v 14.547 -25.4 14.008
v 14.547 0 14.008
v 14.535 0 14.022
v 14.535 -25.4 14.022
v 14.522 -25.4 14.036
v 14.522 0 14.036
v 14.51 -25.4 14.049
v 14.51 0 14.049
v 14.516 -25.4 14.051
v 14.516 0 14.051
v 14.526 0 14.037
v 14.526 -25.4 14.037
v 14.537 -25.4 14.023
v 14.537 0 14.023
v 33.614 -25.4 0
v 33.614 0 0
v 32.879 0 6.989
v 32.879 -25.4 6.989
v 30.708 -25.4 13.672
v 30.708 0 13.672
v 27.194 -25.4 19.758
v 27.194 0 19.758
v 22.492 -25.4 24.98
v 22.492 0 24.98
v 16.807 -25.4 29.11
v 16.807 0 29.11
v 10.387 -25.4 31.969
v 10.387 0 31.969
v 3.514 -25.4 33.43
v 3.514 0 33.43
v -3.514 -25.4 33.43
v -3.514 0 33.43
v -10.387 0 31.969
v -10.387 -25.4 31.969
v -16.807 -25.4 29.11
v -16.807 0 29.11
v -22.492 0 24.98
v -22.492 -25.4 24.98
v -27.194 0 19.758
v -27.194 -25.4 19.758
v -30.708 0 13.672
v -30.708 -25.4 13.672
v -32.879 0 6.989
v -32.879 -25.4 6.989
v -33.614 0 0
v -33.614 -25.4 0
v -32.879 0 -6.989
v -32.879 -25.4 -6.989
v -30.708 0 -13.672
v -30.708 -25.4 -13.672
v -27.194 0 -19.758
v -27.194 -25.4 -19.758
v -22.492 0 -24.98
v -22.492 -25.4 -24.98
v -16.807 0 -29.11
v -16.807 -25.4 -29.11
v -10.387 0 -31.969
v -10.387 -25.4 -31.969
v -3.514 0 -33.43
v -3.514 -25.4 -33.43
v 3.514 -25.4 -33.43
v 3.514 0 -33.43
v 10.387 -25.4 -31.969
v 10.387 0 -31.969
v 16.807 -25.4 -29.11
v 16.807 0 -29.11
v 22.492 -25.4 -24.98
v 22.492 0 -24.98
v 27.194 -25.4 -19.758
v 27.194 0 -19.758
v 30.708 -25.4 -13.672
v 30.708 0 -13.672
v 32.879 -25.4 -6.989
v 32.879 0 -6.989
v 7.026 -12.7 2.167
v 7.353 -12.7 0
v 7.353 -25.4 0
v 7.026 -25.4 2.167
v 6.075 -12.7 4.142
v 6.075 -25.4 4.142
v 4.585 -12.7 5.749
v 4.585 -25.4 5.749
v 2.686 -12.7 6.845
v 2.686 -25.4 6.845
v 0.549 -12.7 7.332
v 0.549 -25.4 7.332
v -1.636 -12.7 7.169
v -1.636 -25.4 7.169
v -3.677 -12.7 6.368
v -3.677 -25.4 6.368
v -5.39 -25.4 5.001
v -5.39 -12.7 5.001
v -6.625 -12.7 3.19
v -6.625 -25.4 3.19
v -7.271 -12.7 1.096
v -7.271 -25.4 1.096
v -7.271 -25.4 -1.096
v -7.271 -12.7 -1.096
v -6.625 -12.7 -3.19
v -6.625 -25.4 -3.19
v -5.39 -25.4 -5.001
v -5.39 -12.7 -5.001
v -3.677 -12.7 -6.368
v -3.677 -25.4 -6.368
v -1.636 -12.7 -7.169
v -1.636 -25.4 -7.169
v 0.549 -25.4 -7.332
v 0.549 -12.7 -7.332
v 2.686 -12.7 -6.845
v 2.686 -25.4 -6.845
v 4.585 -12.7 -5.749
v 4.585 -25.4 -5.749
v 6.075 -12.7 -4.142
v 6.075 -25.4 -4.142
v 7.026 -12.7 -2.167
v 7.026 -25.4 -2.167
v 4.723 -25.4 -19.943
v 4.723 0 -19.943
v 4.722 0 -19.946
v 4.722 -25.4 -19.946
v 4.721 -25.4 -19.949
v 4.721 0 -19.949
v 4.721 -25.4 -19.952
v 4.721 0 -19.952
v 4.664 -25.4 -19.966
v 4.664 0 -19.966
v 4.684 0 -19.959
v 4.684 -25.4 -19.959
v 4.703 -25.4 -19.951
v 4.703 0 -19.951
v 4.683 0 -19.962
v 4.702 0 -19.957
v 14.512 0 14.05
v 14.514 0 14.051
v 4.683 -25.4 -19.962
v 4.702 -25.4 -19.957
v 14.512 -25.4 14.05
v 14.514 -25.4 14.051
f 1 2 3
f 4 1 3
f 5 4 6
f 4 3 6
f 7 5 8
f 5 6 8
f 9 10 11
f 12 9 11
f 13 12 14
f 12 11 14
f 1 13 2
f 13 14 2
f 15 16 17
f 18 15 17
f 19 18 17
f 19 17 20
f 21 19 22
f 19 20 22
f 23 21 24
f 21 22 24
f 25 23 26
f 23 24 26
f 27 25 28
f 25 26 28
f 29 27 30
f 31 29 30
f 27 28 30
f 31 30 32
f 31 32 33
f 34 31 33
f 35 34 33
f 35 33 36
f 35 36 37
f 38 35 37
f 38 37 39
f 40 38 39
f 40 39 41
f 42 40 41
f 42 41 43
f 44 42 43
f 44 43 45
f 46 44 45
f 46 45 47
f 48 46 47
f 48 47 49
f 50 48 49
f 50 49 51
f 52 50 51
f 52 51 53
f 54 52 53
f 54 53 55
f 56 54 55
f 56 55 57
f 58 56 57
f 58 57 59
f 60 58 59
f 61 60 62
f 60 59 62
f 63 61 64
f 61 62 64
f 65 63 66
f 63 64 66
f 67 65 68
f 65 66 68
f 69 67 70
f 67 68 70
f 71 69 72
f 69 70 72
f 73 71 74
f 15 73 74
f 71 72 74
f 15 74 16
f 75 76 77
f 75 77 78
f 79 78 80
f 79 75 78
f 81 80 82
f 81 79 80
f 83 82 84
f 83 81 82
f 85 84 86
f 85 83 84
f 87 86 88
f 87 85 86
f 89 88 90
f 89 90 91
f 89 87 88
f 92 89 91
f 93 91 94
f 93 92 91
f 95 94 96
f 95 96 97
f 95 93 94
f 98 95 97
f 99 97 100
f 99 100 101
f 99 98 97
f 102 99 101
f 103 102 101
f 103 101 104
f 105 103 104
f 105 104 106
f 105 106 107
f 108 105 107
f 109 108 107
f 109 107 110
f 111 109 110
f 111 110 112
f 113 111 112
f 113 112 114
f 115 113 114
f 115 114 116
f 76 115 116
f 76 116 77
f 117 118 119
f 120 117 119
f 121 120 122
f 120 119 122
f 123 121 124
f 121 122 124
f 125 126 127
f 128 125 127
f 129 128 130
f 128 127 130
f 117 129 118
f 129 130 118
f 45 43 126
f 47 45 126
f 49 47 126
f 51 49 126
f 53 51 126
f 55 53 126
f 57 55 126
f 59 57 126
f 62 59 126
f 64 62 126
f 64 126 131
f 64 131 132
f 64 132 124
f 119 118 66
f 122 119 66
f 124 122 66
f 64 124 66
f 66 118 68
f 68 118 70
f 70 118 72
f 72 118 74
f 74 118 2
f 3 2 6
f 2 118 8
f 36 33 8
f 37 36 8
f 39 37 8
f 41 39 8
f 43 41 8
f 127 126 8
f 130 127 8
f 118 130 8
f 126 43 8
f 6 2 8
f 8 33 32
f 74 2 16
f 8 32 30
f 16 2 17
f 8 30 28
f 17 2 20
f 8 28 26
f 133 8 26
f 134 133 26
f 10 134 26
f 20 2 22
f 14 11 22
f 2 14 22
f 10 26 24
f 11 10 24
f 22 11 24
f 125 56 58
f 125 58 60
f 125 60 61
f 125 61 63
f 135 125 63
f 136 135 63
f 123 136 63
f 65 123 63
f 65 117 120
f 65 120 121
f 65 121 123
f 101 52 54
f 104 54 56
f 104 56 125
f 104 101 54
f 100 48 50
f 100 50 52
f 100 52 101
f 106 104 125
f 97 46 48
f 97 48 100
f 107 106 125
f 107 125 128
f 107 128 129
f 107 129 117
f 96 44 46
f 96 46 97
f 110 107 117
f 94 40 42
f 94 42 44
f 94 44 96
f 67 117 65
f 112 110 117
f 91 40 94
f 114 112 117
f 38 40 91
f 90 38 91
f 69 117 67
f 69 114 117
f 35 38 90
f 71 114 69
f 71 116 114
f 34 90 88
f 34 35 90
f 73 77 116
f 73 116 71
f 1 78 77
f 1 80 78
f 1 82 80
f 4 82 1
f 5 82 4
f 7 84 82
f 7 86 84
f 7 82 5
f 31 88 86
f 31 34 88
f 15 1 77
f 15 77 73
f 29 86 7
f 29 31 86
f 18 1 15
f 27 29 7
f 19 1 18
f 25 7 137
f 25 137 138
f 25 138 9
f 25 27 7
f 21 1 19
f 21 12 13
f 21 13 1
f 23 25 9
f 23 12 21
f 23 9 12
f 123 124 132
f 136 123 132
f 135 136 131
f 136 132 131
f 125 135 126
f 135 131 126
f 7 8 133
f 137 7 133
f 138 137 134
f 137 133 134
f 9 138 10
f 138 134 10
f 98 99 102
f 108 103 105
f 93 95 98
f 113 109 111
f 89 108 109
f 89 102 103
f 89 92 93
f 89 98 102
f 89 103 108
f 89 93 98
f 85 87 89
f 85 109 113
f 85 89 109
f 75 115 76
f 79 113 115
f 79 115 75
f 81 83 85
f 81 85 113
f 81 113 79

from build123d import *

# Parameters (mm, degrees)
F0_R     = 33.613844165
F0_R_2   = 7.3530240303
F1_DEPTH = 12.7
F2_DEPTH = 25.4


with BuildPart() as f1:
    # F0 (on Front) → F1 (new body)
    with BuildSketch(Plane.XZ):
        Circle(F0_R)
        with BuildLine():
            ThreePointArc((4.7208512746, -19.951569966), (4.6925332266, -19.9590350044), (4.6642082743, -19.9664738029))
            ThreePointArc((4.6642082743, -19.9664738029), (4.6934800842, -19.9547063806), (4.7227373879, -19.9429029377))
            ThreePointArc((4.7227373879, -19.9429029377), (4.7217944882, -19.947236486), (4.7208512746, -19.951569966))
        make_face(mode=Mode.SUBTRACT)
        Circle(F0_R_2, mode=Mode.SUBTRACT)
        with BuildLine():
            ThreePointArc((14.5159144375, 14.0511614861), (14.5316083012, 14.029833317), (14.547274448, 14.0084847808))
            ThreePointArc((14.547274448, 14.0084847808), (14.5285756501, 14.0288524457), (14.5098472673, 14.0491929102))
            ThreePointArc((14.5098472673, 14.0491929102), (14.5128808291, 14.0501772698), (14.5159144375, 14.0511614861))
        make_face(mode=Mode.SUBTRACT)
        Circle(F0_R_2)
    extrude(amount=F1_DEPTH)

    # F0 (on Front) → F2 (join)
    with BuildSketch(Plane.XZ):
        Circle(F0_R)
        with BuildLine():
            ThreePointArc((4.7208512746, -19.951569966), (4.6925332266, -19.9590350044), (4.6642082743, -19.9664738029))
            ThreePointArc((4.6642082743, -19.9664738029), (4.6934800842, -19.9547063806), (4.7227373879, -19.9429029377))
            ThreePointArc((4.7227373879, -19.9429029377), (4.7217944882, -19.947236486), (4.7208512746, -19.951569966))
        make_face(mode=Mode.SUBTRACT)
        Circle(F0_R_2, mode=Mode.SUBTRACT)
        with BuildLine():
            ThreePointArc((14.5159144375, 14.0511614861), (14.5316083012, 14.029833317), (14.547274448, 14.0084847808))
            ThreePointArc((14.547274448, 14.0084847808), (14.5285756501, 14.0288524457), (14.5098472673, 14.0491929102))
            ThreePointArc((14.5098472673, 14.0491929102), (14.5128808291, 14.0501772698), (14.5159144375, 14.0511614861))
        make_face(mode=Mode.SUBTRACT)
    extrude(amount=F2_DEPTH)


solid = f1.part
